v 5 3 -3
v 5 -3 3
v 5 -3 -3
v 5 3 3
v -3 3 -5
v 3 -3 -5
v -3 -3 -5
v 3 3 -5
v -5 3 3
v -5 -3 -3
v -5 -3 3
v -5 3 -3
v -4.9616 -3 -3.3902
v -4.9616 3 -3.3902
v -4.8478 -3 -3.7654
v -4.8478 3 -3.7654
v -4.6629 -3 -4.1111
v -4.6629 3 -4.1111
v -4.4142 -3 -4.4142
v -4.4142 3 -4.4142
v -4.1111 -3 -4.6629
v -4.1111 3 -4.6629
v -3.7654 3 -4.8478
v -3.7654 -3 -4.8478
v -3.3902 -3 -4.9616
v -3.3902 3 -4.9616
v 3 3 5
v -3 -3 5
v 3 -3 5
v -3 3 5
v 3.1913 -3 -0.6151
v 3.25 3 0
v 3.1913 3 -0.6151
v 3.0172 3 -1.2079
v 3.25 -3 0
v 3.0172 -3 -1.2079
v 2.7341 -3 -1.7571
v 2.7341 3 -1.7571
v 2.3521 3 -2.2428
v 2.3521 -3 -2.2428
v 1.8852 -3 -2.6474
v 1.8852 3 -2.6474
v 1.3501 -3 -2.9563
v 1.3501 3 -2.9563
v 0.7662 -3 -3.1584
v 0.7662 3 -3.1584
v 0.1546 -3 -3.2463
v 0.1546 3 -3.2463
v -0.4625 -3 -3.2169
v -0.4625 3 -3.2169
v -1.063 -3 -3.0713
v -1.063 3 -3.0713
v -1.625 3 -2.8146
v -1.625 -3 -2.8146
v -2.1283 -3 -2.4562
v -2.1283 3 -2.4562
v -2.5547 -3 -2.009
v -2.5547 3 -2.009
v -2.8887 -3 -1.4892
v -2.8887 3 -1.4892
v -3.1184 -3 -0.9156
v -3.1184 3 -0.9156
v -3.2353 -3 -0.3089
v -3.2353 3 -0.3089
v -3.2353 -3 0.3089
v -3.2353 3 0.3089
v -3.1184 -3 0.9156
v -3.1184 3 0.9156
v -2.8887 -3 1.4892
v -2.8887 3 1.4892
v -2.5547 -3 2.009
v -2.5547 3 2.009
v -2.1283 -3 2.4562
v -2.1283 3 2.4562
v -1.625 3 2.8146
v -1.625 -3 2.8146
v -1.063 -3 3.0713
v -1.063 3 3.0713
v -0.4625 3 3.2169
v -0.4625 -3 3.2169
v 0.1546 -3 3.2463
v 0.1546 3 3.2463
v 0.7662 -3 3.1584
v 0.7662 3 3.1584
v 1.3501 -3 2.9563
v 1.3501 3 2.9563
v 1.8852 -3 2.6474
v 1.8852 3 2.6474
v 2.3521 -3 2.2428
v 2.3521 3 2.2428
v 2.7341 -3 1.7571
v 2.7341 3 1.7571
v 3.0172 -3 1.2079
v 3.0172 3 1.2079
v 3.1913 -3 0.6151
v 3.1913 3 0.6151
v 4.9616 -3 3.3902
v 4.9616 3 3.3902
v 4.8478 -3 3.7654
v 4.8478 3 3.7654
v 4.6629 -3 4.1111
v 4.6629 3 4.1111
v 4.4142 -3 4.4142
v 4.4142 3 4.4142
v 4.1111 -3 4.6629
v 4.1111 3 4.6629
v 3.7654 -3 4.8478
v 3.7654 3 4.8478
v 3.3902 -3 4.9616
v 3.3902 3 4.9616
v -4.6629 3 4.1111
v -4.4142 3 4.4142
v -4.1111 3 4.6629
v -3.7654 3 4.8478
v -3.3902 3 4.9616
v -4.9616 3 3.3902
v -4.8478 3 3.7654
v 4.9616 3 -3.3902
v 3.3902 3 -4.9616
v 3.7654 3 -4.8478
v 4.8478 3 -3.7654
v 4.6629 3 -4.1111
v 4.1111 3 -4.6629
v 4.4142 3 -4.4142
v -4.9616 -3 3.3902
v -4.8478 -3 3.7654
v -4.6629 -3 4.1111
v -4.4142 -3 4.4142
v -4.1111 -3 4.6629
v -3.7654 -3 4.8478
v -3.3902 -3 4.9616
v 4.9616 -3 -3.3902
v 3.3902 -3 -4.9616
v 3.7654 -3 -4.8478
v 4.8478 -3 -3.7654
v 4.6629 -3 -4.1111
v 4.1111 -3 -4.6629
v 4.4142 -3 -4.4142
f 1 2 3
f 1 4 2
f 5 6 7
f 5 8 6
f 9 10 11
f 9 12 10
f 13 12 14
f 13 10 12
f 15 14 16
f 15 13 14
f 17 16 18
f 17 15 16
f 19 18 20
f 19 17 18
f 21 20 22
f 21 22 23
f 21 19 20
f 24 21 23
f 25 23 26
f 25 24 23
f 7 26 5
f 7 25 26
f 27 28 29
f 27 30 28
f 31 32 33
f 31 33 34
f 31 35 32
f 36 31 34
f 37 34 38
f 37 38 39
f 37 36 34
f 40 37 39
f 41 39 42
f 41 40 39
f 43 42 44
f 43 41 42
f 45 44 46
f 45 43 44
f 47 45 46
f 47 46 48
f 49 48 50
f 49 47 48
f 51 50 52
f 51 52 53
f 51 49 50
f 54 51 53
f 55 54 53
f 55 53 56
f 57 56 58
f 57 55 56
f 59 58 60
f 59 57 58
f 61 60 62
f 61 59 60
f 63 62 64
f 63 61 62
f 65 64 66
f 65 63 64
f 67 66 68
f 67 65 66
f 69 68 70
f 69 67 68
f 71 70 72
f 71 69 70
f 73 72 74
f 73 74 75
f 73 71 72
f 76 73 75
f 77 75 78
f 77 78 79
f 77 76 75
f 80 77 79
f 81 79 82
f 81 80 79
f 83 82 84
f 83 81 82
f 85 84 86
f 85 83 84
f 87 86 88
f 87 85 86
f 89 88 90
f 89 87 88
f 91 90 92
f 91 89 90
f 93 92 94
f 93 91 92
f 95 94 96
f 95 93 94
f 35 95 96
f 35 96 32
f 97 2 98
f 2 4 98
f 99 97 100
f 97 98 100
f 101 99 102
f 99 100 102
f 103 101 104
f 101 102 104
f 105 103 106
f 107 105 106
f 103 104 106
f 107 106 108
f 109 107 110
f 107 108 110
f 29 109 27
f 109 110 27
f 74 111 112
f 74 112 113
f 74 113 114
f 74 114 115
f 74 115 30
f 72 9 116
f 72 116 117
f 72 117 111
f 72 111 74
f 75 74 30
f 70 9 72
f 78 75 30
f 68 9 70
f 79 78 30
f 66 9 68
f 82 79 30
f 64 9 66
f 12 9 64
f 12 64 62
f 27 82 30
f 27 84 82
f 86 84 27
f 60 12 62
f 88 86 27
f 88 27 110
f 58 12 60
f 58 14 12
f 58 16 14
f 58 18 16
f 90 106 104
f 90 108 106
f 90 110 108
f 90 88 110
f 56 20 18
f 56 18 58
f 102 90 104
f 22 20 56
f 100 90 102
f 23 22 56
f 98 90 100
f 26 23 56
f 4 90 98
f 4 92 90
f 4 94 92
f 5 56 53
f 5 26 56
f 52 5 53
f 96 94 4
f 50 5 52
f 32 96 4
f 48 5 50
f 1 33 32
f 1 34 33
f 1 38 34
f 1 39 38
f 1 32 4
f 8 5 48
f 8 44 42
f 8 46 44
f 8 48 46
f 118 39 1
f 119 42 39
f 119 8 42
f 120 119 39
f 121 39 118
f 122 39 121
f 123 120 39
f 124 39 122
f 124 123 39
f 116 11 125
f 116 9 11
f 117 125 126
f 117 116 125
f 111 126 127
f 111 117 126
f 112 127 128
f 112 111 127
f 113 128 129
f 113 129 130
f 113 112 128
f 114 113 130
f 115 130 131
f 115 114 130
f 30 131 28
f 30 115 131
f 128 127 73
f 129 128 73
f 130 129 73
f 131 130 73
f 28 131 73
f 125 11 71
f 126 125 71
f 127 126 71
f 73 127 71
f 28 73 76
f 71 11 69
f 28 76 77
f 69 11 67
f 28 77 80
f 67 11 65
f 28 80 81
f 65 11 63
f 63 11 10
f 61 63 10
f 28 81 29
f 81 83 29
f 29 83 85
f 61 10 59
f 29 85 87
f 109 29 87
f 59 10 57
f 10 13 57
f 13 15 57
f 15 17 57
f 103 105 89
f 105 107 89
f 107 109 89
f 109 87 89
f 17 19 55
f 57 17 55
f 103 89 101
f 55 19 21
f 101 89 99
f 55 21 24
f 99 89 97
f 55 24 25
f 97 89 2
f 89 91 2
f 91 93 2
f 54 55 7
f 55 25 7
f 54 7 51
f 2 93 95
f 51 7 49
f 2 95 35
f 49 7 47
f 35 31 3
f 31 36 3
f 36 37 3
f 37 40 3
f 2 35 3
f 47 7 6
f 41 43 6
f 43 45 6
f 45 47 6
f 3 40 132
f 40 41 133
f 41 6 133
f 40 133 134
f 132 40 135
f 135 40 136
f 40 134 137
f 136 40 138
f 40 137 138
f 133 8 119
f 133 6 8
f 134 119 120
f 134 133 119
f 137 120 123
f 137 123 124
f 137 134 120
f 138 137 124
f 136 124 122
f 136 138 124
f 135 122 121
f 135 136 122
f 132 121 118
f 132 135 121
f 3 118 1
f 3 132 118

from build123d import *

# Parameters (mm, degrees)
SKETCH1_R           = 5
SKETCH1_R_2         = 3.25
BOSS_EXTRUDE1_DEPTH = 3
FILLET1_R           = 2


with BuildPart() as part:
    # Sketch1 → Boss-Extrude1 (new body, symmetric)
    with BuildSketch(Plane(origin=(0, 0, 0), x_dir=(1, 0, 0), z_dir=(0, 1, 0))):
        with BuildLine():
            Line((-5, 5), (-5, 0))
            ThreePointArc((-5, 0), (-3.535533906, 3.535533906), (0, 5))
            Line((0, 5), (-5, 5))
        make_face()
        Circle(SKETCH1_R)
        Circle(SKETCH1_R_2, mode=Mode.SUBTRACT)
        with BuildLine():
            ThreePointArc((0, 5), (3.535533906, 3.535533906), (5, 0))
            Line((5, 0), (5, 5))
            Line((5, 5), (0, 5))
        make_face()
        with BuildLine():
            ThreePointArc((5, 0), (3.535533906, -3.535533906), (0, -5))
            Line((0, -5), (5, -5))
            Line((5, -5), (5, 0))
        make_face()
        with BuildLine():
            Line((-5, 0), (-5, -5))
            Line((-5, -5), (0, -5))
            ThreePointArc((0, -5), (-3.535533906, -3.535533906), (-5, 0))
        make_face()
    extrude(amount=BOSS_EXTRUDE1_DEPTH, both=True)

    # Fillet1
    fillet1_edges = [part.edges().sort_by_distance(p)[0] for p in [
        (-5, 0, -5),
        (5, 0, -5),
        (5, 0, 5),
        (-5, 0, 5),
    ]]
    fillet(fillet1_edges, radius=FILLET1_R)


solid = part.part
